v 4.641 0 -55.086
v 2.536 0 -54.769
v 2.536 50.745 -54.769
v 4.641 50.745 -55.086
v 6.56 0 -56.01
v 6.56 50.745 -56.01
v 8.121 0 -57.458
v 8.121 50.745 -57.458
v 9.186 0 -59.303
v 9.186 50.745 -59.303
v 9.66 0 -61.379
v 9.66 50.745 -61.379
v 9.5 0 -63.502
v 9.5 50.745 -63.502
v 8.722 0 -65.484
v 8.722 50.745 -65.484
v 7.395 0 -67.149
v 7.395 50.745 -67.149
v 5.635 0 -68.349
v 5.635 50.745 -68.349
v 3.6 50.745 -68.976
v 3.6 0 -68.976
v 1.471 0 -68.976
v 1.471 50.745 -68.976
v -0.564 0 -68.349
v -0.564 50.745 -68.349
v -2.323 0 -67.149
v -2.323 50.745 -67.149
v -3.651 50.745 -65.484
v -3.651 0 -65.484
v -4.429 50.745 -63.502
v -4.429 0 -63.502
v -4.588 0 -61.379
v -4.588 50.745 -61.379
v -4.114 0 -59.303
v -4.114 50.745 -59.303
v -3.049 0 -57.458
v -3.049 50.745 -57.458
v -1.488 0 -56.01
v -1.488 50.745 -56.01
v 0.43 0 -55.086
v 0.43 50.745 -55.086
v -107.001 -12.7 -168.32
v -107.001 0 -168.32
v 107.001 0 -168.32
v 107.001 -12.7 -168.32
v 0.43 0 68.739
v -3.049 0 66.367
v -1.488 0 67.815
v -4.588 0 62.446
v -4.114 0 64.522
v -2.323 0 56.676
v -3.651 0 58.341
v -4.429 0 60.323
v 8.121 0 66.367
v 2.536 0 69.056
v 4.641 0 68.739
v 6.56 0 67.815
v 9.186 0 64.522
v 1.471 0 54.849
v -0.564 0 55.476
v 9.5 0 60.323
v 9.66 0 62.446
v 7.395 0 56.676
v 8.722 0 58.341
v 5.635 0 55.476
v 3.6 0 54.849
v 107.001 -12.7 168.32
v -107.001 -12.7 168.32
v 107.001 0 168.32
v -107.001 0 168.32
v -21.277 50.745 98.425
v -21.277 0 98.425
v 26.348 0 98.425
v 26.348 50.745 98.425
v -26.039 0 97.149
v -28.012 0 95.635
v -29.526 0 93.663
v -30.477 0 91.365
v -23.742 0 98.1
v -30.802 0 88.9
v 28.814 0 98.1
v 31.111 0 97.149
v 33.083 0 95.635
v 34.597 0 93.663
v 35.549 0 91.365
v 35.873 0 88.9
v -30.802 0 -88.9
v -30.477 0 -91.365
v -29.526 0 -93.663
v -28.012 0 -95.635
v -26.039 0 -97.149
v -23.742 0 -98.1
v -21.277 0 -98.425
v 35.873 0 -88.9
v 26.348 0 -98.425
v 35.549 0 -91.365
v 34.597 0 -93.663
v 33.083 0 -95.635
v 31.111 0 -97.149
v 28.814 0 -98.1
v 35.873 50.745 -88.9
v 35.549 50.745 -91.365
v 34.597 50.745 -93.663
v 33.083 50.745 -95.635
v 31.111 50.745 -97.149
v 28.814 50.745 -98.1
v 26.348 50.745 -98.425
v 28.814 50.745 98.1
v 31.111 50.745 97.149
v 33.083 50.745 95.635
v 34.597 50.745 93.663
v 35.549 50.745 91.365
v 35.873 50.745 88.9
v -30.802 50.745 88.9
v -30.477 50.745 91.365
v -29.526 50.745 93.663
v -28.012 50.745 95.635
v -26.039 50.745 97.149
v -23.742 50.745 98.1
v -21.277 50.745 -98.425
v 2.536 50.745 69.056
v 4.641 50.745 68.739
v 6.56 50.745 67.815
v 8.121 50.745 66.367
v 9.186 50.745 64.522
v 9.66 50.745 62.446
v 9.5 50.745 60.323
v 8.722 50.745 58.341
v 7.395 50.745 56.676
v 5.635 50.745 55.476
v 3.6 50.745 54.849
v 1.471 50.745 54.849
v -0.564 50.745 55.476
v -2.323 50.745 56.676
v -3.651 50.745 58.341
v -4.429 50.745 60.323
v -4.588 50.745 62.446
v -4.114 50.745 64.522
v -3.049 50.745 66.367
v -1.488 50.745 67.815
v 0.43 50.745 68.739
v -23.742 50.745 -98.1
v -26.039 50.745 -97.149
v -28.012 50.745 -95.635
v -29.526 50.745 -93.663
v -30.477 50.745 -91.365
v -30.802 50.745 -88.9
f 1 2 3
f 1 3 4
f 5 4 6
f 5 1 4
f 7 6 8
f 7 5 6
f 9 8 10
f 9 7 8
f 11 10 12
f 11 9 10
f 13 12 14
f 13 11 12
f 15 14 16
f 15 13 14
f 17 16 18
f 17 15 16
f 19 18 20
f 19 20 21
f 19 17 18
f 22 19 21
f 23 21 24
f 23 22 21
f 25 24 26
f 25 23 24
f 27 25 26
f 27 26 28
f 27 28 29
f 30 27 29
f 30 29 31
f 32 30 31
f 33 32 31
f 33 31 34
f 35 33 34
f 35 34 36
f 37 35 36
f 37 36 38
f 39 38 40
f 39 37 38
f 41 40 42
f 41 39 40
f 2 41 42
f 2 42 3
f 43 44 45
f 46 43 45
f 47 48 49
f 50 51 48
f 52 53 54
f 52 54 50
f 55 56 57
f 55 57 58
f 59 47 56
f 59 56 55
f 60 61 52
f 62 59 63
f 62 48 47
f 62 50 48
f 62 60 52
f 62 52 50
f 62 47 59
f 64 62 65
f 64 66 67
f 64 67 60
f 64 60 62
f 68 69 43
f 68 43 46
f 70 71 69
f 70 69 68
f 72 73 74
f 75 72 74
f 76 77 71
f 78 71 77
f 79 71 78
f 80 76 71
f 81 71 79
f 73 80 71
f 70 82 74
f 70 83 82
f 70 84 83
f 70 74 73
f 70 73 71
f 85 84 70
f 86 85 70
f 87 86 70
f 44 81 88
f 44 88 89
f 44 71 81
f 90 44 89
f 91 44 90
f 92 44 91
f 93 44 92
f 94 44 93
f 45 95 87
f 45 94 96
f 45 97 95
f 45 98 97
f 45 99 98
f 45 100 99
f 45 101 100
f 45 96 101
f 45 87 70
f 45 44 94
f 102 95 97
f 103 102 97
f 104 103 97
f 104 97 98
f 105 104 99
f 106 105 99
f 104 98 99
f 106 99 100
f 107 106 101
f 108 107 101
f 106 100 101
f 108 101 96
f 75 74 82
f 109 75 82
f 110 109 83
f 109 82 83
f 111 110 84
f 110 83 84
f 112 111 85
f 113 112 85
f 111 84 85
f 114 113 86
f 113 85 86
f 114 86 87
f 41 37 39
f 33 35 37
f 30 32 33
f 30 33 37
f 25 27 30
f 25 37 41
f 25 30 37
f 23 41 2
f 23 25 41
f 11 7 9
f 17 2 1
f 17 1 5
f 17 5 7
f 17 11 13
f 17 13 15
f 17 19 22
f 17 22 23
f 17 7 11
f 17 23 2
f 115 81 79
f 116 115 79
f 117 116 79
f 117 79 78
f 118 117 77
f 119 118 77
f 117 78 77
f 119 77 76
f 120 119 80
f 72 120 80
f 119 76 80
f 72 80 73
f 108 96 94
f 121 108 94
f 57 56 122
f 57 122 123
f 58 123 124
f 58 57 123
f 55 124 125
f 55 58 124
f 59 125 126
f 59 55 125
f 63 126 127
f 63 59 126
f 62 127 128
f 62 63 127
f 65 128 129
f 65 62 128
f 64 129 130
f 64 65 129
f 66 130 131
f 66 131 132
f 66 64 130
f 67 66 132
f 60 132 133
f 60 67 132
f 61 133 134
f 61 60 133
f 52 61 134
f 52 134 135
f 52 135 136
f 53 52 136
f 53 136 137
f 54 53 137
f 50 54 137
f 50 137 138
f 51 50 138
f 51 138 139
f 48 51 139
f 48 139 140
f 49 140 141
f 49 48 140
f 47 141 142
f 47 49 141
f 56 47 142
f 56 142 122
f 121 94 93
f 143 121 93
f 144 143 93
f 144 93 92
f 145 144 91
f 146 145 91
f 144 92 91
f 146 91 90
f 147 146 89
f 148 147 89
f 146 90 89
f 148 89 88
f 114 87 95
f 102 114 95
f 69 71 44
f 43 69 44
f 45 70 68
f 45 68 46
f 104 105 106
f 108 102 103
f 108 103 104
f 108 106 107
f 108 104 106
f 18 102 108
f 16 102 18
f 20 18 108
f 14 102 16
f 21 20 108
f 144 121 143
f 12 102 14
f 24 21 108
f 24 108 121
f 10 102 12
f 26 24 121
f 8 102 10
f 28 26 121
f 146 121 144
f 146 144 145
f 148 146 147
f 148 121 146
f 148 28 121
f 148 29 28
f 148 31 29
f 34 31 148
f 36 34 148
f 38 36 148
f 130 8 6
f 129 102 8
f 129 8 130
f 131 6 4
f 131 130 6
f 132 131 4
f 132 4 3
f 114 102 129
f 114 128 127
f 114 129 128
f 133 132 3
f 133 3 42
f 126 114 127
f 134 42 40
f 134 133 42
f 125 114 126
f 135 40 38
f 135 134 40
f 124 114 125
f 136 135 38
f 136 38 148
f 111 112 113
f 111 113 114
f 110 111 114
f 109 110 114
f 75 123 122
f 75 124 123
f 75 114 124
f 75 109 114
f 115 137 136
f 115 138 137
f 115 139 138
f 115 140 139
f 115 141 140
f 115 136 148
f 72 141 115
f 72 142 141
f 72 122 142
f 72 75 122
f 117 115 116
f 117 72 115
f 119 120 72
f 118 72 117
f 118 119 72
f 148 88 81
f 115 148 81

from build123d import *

# Parameters (mm, degrees)
SKETCH1_W      = 214.001476942
SKETCH1_H      = 336.63984765
EXTRUDE1_DEPTH = 12.7
SKETCH2_R      = 7.14375
EXTRUDE2_DEPTH = 50.744786622


with BuildPart() as part:
    # Sketch1 → Extrude1 (new body)
    with BuildSketch(Plane(origin=(0, 0, 0), x_dir=(1, 0, 0), z_dir=(0, 1, 0))):
        Rectangle(SKETCH1_W, SKETCH1_H)
    extrude(amount=-EXTRUDE1_DEPTH)

    # Sketch2 → Extrude2 (add)
    with BuildSketch(Plane(origin=(0, 0, 0), x_dir=(-1, 0, 0), z_dir=(0, 1, 0))):
        with BuildLine():
            Line((-35.873271056, 88.9), (-35.873271056, -88.9))
            ThreePointArc((-35.873271056, -88.9), (-33.083463147, -95.635192091), (-26.348271056, -98.425))
            Line((-26.348271056, -98.425), (21.276728944, -98.425))
            ThreePointArc((21.276728944, -98.425), (28.011921035, -95.635192091), (30.801728944, -88.9))
            Line((30.801728944, -88.9), (30.801728944, 88.9))
            ThreePointArc((30.801728944, 88.9), (28.011921035, 95.635192091), (21.276728944, 98.425))
            Line((21.276728944, 98.425), (-26.348271056, 98.425))
            ThreePointArc((-26.348271056, 98.425), (-33.083463147, 95.635192091), (-35.873271056, 88.9))
        make_face()
        with Locations(Location((-2.535771056, 61.9125, 0), (0, 0, 90))):
            Circle(SKETCH2_R, mode=Mode.SUBTRACT)
        with Locations(Location((-2.535771056, -61.9125, 0), (0, 0, 90))):
            Circle(SKETCH2_R, mode=Mode.SUBTRACT)
    extrude(amount=EXTRUDE2_DEPTH)


solid = part.part
